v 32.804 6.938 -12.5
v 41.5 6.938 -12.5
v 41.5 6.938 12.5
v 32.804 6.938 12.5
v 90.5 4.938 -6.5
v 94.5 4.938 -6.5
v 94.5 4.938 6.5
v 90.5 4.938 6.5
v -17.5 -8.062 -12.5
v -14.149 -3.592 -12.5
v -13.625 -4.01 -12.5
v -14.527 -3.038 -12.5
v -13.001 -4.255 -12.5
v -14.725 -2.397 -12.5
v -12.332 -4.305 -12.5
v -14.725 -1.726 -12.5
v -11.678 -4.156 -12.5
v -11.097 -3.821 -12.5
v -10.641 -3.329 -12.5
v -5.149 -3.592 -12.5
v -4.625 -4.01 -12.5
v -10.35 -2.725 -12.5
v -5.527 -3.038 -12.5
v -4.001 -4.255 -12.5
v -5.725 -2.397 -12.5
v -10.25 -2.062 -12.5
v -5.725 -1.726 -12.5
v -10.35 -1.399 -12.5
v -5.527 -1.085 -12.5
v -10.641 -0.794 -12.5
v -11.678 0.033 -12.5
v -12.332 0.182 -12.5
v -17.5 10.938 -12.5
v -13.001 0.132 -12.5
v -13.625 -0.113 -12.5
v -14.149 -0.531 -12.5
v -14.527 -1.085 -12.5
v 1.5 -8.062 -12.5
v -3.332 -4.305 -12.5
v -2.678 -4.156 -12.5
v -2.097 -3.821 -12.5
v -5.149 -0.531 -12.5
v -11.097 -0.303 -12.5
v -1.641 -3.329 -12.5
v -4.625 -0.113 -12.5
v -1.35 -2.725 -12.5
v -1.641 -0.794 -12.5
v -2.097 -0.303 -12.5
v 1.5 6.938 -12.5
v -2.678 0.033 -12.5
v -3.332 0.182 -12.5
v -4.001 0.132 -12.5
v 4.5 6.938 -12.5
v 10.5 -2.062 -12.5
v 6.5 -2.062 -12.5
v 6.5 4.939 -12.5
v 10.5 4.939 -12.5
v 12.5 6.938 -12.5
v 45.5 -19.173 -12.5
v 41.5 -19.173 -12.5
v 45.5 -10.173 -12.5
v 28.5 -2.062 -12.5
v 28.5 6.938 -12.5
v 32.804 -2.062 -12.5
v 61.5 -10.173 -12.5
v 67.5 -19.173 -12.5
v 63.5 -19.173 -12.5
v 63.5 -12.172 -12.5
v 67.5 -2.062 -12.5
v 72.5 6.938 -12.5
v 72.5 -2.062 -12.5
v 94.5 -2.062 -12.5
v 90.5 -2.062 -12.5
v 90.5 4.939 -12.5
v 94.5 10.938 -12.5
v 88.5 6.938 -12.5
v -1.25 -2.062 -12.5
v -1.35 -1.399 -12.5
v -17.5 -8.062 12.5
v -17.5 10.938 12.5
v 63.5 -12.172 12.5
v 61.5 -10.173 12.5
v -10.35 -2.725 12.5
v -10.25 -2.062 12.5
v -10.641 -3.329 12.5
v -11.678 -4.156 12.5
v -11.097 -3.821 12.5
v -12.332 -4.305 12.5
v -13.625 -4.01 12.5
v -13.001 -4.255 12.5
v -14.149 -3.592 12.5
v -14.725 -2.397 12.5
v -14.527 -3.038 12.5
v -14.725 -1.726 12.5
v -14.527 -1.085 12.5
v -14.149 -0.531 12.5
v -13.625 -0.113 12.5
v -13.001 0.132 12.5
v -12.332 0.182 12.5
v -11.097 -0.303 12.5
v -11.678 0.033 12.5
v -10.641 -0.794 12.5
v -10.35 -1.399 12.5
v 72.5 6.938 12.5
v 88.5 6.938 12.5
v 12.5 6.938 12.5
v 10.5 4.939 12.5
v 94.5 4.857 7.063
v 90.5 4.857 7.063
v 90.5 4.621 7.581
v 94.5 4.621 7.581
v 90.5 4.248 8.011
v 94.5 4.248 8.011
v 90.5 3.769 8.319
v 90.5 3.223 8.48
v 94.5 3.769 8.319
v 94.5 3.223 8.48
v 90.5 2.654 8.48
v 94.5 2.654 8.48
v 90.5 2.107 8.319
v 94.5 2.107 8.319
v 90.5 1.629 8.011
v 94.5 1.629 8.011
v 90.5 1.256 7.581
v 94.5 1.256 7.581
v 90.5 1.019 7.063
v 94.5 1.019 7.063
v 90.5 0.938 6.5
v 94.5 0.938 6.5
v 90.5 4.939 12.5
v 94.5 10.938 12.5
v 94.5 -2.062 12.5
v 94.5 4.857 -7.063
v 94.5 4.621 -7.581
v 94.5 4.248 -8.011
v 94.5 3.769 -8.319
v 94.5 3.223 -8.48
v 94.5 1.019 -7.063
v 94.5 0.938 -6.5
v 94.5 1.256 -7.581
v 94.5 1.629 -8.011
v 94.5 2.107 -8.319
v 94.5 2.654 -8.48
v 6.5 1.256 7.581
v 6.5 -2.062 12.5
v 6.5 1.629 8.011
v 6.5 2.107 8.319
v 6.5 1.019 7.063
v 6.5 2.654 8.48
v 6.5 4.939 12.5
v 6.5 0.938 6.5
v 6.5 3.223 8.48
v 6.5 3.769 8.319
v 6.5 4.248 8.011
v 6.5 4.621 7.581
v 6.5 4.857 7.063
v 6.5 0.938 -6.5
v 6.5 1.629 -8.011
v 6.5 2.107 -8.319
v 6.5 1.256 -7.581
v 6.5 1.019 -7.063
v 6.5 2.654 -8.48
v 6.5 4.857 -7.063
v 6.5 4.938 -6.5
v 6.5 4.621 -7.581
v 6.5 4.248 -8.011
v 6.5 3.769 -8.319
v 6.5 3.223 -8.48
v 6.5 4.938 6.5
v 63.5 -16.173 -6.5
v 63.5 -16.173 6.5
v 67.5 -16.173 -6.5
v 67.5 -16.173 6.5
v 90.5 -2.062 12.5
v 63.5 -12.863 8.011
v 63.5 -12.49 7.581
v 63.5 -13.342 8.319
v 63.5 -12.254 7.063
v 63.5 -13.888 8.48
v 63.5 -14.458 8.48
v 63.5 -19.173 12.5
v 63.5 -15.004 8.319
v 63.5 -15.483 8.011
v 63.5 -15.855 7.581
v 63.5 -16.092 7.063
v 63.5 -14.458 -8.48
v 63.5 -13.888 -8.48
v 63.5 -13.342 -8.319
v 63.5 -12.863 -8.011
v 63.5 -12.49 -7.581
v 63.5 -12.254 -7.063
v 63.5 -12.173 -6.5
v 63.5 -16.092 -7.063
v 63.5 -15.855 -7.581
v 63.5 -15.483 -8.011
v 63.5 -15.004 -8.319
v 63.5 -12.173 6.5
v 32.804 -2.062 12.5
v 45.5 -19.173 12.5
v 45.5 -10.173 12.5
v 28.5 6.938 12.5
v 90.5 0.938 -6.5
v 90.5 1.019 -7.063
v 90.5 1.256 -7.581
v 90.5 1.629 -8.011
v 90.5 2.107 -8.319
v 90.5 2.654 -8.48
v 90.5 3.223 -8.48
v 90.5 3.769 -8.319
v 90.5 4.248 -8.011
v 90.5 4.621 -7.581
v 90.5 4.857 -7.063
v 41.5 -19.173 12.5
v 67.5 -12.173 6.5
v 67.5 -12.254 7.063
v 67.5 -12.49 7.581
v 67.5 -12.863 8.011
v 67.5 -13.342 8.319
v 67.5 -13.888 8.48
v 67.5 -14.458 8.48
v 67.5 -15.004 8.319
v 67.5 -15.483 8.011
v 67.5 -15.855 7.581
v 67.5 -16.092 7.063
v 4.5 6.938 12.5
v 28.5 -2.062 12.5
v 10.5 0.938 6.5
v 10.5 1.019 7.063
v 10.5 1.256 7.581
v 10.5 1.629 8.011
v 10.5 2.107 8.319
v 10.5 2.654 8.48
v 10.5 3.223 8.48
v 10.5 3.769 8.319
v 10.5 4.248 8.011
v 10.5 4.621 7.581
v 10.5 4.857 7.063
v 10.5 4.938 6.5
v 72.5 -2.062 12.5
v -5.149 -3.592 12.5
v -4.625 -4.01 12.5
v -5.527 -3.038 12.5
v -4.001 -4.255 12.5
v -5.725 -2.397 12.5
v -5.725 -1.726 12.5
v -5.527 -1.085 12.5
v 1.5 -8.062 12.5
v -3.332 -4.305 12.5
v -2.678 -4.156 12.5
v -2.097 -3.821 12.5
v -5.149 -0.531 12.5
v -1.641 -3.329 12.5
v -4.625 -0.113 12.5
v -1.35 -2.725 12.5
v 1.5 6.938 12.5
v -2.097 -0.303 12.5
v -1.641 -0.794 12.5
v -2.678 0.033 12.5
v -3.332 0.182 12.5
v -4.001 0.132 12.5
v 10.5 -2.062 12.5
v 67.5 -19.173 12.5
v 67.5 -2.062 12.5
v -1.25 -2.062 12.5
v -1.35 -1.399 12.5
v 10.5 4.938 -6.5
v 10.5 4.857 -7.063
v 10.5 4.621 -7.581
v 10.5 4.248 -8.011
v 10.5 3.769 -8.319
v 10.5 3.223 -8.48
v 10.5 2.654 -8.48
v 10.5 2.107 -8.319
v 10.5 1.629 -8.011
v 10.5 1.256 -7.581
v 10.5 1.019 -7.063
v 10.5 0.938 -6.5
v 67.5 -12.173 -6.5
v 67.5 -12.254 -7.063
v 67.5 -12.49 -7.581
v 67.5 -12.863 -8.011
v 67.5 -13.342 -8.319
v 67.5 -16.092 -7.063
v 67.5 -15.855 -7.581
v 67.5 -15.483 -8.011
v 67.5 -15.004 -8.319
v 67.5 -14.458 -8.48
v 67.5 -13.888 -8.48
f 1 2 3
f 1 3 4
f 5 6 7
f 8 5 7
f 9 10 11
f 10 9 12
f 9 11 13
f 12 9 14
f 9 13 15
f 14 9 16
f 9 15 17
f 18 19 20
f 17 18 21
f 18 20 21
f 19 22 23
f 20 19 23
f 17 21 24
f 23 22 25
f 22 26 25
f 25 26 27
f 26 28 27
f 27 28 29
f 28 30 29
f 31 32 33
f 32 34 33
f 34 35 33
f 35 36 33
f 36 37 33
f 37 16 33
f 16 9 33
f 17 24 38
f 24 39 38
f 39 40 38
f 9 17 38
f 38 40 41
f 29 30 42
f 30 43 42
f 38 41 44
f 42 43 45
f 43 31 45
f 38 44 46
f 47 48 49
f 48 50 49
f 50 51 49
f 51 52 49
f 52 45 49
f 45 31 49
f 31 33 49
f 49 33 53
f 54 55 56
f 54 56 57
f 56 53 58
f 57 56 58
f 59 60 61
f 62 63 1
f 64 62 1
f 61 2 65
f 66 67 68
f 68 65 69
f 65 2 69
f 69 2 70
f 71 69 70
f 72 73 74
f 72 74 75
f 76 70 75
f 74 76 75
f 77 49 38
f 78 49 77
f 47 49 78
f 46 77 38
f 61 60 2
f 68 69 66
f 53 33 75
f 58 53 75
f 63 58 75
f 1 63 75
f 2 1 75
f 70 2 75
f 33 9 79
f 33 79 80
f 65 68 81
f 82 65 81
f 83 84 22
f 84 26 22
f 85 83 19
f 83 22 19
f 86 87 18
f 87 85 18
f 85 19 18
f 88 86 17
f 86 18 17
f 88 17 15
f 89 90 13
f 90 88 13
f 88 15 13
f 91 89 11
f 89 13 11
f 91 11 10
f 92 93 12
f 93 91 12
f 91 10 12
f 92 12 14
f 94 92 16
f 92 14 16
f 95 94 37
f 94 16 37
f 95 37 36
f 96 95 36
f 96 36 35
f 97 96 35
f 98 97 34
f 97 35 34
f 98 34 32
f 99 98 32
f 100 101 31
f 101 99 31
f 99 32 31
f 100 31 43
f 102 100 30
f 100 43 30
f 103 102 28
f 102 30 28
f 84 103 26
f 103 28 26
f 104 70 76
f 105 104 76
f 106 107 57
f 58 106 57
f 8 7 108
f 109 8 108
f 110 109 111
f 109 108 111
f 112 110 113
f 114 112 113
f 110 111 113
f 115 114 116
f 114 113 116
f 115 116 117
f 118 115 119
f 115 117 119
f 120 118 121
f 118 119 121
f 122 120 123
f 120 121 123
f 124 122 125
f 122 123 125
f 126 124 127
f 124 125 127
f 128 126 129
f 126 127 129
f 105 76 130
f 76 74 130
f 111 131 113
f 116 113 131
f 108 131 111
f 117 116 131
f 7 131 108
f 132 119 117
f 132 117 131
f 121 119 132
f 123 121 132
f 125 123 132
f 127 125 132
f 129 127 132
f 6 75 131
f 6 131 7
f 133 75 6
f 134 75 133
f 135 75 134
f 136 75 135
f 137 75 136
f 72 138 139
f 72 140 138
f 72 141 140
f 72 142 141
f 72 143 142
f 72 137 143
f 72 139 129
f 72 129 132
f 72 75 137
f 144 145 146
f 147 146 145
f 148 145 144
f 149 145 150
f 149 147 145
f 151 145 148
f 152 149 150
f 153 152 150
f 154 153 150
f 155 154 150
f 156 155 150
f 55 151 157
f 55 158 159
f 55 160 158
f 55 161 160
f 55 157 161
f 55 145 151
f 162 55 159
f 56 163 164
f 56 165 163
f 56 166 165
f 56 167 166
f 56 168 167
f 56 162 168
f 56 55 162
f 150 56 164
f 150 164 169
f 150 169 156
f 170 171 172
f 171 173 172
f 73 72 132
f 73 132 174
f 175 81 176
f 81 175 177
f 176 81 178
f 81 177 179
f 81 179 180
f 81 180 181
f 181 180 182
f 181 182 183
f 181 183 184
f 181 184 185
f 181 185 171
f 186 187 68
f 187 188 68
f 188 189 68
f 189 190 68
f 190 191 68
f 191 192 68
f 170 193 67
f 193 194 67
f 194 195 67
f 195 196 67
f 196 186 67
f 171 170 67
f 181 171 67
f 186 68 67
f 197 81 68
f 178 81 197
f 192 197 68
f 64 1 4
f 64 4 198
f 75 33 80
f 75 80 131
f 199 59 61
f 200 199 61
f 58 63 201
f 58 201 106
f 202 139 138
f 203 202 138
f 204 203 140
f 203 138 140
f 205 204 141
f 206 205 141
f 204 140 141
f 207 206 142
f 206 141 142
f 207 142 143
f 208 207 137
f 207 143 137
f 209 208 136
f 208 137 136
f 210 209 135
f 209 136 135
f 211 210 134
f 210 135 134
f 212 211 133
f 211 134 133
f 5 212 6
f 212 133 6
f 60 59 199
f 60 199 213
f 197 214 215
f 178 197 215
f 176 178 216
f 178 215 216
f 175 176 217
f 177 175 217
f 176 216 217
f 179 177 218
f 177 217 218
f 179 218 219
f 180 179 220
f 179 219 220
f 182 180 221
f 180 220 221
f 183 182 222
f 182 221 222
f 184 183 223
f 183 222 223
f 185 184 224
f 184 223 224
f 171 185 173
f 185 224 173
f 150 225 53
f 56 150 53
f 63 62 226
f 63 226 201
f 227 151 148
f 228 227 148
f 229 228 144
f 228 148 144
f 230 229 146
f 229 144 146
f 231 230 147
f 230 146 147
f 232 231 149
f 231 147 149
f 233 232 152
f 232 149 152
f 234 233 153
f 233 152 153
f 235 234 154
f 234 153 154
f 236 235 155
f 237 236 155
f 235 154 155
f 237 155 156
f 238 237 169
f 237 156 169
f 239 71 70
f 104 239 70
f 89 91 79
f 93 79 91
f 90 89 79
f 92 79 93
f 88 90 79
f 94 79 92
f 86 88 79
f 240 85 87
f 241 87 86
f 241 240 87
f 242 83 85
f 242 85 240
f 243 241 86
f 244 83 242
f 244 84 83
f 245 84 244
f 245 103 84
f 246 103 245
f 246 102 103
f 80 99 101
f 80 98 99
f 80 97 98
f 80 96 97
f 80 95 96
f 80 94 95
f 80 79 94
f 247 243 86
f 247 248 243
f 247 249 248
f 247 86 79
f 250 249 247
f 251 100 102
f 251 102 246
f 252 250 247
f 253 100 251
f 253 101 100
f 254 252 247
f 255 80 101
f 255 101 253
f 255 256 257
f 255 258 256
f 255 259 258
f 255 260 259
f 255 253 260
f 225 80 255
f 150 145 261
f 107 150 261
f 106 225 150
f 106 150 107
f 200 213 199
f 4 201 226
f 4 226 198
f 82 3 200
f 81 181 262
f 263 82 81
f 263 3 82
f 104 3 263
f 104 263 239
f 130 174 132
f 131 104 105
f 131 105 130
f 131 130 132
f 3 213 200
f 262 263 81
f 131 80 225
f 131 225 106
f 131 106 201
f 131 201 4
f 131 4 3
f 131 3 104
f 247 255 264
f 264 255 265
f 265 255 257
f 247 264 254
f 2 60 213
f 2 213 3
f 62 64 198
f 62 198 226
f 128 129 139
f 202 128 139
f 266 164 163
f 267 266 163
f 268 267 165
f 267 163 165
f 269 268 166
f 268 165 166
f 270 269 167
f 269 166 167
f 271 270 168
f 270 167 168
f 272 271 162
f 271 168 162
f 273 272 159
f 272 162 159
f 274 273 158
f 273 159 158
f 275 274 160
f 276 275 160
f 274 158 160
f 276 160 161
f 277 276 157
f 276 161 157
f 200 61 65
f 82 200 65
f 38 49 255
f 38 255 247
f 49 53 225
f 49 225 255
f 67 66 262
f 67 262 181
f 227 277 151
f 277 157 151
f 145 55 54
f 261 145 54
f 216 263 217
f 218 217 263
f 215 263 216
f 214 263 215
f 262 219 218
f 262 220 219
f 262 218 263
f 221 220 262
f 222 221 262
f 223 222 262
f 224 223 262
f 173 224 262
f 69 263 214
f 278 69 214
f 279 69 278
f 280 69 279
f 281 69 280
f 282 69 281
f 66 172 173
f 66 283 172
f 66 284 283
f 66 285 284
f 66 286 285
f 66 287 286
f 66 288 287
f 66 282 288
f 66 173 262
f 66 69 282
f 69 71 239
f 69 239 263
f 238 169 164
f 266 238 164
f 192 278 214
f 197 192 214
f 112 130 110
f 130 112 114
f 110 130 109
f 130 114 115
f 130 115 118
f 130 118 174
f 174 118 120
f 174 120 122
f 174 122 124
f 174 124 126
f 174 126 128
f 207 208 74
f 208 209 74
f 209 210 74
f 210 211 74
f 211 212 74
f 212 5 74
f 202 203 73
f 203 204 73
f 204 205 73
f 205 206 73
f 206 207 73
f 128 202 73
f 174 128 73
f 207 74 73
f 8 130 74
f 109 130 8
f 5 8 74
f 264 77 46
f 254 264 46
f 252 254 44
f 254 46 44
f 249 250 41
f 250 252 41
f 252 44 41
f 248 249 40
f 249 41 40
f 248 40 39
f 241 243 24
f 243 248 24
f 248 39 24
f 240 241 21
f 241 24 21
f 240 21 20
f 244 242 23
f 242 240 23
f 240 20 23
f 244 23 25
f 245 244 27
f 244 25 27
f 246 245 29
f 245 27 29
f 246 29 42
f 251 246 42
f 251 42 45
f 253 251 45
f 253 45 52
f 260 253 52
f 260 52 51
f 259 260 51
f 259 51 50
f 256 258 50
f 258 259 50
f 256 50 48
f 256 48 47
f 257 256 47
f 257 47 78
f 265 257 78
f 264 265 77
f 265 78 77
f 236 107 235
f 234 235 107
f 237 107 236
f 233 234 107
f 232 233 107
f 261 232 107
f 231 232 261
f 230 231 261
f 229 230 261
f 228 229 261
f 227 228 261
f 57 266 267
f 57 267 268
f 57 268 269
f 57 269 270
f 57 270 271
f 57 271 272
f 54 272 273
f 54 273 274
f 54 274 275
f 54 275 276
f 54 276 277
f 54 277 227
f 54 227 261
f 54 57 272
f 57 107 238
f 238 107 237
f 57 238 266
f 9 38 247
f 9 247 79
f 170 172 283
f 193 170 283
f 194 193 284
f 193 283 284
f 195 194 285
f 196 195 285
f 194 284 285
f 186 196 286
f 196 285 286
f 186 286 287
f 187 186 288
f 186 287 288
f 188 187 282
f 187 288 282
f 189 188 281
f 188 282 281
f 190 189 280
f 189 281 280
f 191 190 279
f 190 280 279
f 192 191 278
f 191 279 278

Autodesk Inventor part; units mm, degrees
ref_plane "YZ Plane" through (0, 0, 0) normal (1, 0, 0) x (0, 1, 0)
sketch "スケッチ1" plane through (0, 0, 0) normal (0, 0, 1) x (1, 0, 0)
  line L0 (94.5, 10.9383) -> (94.5, -2.0617)
  line L1 (67.5, -2.0617) -> (67.5, -19.1729)
  line L2 (45.5, -19.1729) -> (45.5, -10.1729)
  line L3 (45.5, -10.1729) -> (63.5, -10.1729)
  line L4 (63.5, -10.1729) -> (63.5, -19.1729)
  line L5 (67.5, -19.1729) -> (63.5, -19.1729)
  line L6 (45.5, -19.1729) -> (41.5, -19.1729)
  line L7 (72.5, -2.0617) -> (72.5, 6.9383)
  line L8 (72.5, 6.9383) -> (90.5, 6.9383)
  line L9 (90.5, 6.9383) -> (90.5, -2.0617)
  line L10 (45.5, -19.1729) -> (55.5, -19.1729) construction
  line L11 (55.5, -19.1729) -> (55.5, -10.1729) construction
  line L12 (50.5, -19.1729) -> (50.5, 17.1682) construction
  line L13 (28.5, -2.0617) -> (28.5, 6.9383)
  line L14 (28.5, 6.9383) -> (10.5, 6.9383)
  line L15 (10.5, 6.9383) -> (10.5, -2.0617)
  line L16 (-17.5, 10.9383) -> (94.5, 10.9383)
  line L17 (94.5, -2.0617) -> (90.5, -2.0617)
  line L18 (72.5, -2.0617) -> (67.5, -2.0617)
  line L19 (6.5, -2.0617) -> (10.5, -2.0617)
  line L20 (6.5, -2.0617) -> (6.5, 6.9383)
  line L21 (6.5, 6.9383) -> (1.5, 6.9383)
  line L22 (72.5, -2.0617) -> (82.5, -2.0617) construction
  line L23 (82.5, -2.0617) -> (82.5, 6.9383) construction
  line L24 (77.5, -2.0617) -> (77.5, 30.8698) construction
  line L25 (28.5, -2.0617) -> (18.5, -2.0617) construction
  line L26 (18.5, -2.0617) -> (18.5, 6.9383) construction
  line L27 (23.5, -2.0617) -> (23.5, 26.9166) construction
  line L28 (41.5, -19.1729) -> (41.5, 6.9383)
  line L29 (41.5, 6.9383) -> (32.8043, 6.9383)
  line L30 (32.8043, 6.9383) -> (32.8043, -2.0617)
  line L31 (32.8043, -2.0617) -> (28.5, -2.0617)
  line L32 (68.5, 6.9383) -> (45.5, 6.9383)
  line L33 (45.5, 6.9383) -> (45.5, -6.1729)
  line L34 (45.5, -6.1729) -> (60.5869, -6.1729)
  line L35 (60.5869, -6.1729) -> (68.5, 1.7403)
  line L36 (68.5, 1.7403) -> (68.5, 6.9383)
  line L37 (0, -29.1814) -> (0, 40.8784) projected
  line L38 (1.5, 6.9383) -> (1.5, -8.0617)
  line L39 (1.5, -8.0617) -> (-17.5, -8.0617)
  line L40 (-17.5, -8.0617) -> (-17.5, 10.9383)
  circle A0 centre (-12.5, -2.0617) radius 2.25
  circle A1 centre (-3.5, -2.0617) radius 2.25
  line L41 (-12.5, -2.0617) -> (-3.5, -2.0617) construction
  point P0 (0, 0)
  point P1 (68.5, 4.3393)
  point P2 (68.5, 4.4383)
  dimension "d5" = 4
  dimension "d10" = 18
  dimension "d14" = 18
  dimension "d16" = 10
  dimension "d19" = 9
  dimension "d23" = 4
  dimension "d40" = 4
  dimension "d41" = 9
  dimension "d42" = 10
  dimension "d43" = 10
  dimension "d74" = 4
  dimension "d89" = 4
  dimension "d90" = 135
  dimension "d91" = 4
  dimension "d92" = 4
  dimension "d93" = 4
  dimension "d94" = 4
  dimension "d104" = 5
  dimension "d105" = 19
  dimension "d107" = 4.5
  dimension "d108" = 4.5
  dimension "d109" = 9
  dimension "d110" = 5
  dimension "d111" = 6
  dimension "d112" = 19
extrude "押し出し1" add sketch "スケッチ1" along normal mid plane 25 contours L0 L17 L9 L8 L7 L18 L1 L5 L4 L3 L2 L6 L28 L29 L30 L31 L13 L14 L15 L19 L20 L21 L38 L39 L37 L16 | L37 L39 L40 L16 | L36 L35 L34 L33 L32
sketch "スケッチ2" plane through (67.5, -19.1729, 12.5) normal (1, 0, 0) x (0, 0, -1)
  line L0 (6, 3) -> (19, 3)
  arc A0 (19, 3) -> (19, 7) centre (19, 5) ccw
  line L1 (19, 7) -> (6, 7)
  arc A1 (6, 7) -> (6, 3) centre (6, 5) ccw
  line L2 (25, 0) -> (0, 0) projected
  line L3 (25, 17.1112) -> (25, 0) projected
  line L4 (0, 0) -> (0, 17.1112) projected
  point P0 (12.5, 19.1729)
  point P1 (25, 13)
  point P2 (0, 13)
  dimension "d24" = 4
  dimension "d25" = 3
  dimension "d26" = 6
  dimension "d27" = 6
extrude "押し出し2" cut sketch "スケッチ2" against normal up to surface (4 mm away)
chamfer "面取り1" distance 2 angle 45 1 edges at (63.5, -10.1729, 0)
sketch "スケッチ4" plane through (94.5, -2.0617, 12.5) normal (1, 0, 0) x (0, 0, -1)
  line L0 (6, 3) -> (19, 3)
  arc A0 (19, 3) -> (19, 7) centre (19, 5) ccw
  line L1 (19, 7) -> (6, 7)
  arc A1 (6, 7) -> (6, 3) centre (6, 5) ccw
  line L2 (25, 13) -> (25, 0) projected
  line L3 (0, 0) -> (0, 13) projected
  line L4 (25, 0) -> (0, 0) projected
  point P0 (12.5, 2.0617)
  dimension "d45" = 4
  dimension "d46" = 6
  dimension "d47" = 6
  dimension "d48" = 3
extrude "押し出し3" cut sketch "スケッチ4" against normal up to surface (4 mm away)
sketch "スケッチ5" plane through (6.5, -2.0617, 12.5) normal (-1, 0, 0) x (0, 0, 1)
  line L0 (-19, 3) -> (-6, 3) projected
  line L1 (-19, 3) -> (-6, 3)
  arc A0 (-6, 3) -> (-6, 7) centre (-6, 5) ccw
  line L2 (-6, 7) -> (-19, 7) projected
  line L3 (-6, 7) -> (-19, 7)
  arc A1 (-19, 7) -> (-19, 3) centre (-19, 5) ccw
  point P0 (-12.5, 2.0617)
  point P1 (-6, 7)
extrude "押し出し4" cut sketch "スケッチ5" against normal up to surface (4 mm away)
chamfer "面取り4" distance 2 angle 45 3 edges at (90.5, 6.9383, 0) (10.5, 6.9383, 0) (6.5, 6.9383, 0)
ref_plane "作業平面1" through (0, 0, 1.5) normal (0, 0, 1) x (1, 0, 0)
ref_plane "作業平面2" through (0, 0, 0.1) normal (0, 0, 1) x (1, 0, 0)
properties part number "adapter_ver.1"
